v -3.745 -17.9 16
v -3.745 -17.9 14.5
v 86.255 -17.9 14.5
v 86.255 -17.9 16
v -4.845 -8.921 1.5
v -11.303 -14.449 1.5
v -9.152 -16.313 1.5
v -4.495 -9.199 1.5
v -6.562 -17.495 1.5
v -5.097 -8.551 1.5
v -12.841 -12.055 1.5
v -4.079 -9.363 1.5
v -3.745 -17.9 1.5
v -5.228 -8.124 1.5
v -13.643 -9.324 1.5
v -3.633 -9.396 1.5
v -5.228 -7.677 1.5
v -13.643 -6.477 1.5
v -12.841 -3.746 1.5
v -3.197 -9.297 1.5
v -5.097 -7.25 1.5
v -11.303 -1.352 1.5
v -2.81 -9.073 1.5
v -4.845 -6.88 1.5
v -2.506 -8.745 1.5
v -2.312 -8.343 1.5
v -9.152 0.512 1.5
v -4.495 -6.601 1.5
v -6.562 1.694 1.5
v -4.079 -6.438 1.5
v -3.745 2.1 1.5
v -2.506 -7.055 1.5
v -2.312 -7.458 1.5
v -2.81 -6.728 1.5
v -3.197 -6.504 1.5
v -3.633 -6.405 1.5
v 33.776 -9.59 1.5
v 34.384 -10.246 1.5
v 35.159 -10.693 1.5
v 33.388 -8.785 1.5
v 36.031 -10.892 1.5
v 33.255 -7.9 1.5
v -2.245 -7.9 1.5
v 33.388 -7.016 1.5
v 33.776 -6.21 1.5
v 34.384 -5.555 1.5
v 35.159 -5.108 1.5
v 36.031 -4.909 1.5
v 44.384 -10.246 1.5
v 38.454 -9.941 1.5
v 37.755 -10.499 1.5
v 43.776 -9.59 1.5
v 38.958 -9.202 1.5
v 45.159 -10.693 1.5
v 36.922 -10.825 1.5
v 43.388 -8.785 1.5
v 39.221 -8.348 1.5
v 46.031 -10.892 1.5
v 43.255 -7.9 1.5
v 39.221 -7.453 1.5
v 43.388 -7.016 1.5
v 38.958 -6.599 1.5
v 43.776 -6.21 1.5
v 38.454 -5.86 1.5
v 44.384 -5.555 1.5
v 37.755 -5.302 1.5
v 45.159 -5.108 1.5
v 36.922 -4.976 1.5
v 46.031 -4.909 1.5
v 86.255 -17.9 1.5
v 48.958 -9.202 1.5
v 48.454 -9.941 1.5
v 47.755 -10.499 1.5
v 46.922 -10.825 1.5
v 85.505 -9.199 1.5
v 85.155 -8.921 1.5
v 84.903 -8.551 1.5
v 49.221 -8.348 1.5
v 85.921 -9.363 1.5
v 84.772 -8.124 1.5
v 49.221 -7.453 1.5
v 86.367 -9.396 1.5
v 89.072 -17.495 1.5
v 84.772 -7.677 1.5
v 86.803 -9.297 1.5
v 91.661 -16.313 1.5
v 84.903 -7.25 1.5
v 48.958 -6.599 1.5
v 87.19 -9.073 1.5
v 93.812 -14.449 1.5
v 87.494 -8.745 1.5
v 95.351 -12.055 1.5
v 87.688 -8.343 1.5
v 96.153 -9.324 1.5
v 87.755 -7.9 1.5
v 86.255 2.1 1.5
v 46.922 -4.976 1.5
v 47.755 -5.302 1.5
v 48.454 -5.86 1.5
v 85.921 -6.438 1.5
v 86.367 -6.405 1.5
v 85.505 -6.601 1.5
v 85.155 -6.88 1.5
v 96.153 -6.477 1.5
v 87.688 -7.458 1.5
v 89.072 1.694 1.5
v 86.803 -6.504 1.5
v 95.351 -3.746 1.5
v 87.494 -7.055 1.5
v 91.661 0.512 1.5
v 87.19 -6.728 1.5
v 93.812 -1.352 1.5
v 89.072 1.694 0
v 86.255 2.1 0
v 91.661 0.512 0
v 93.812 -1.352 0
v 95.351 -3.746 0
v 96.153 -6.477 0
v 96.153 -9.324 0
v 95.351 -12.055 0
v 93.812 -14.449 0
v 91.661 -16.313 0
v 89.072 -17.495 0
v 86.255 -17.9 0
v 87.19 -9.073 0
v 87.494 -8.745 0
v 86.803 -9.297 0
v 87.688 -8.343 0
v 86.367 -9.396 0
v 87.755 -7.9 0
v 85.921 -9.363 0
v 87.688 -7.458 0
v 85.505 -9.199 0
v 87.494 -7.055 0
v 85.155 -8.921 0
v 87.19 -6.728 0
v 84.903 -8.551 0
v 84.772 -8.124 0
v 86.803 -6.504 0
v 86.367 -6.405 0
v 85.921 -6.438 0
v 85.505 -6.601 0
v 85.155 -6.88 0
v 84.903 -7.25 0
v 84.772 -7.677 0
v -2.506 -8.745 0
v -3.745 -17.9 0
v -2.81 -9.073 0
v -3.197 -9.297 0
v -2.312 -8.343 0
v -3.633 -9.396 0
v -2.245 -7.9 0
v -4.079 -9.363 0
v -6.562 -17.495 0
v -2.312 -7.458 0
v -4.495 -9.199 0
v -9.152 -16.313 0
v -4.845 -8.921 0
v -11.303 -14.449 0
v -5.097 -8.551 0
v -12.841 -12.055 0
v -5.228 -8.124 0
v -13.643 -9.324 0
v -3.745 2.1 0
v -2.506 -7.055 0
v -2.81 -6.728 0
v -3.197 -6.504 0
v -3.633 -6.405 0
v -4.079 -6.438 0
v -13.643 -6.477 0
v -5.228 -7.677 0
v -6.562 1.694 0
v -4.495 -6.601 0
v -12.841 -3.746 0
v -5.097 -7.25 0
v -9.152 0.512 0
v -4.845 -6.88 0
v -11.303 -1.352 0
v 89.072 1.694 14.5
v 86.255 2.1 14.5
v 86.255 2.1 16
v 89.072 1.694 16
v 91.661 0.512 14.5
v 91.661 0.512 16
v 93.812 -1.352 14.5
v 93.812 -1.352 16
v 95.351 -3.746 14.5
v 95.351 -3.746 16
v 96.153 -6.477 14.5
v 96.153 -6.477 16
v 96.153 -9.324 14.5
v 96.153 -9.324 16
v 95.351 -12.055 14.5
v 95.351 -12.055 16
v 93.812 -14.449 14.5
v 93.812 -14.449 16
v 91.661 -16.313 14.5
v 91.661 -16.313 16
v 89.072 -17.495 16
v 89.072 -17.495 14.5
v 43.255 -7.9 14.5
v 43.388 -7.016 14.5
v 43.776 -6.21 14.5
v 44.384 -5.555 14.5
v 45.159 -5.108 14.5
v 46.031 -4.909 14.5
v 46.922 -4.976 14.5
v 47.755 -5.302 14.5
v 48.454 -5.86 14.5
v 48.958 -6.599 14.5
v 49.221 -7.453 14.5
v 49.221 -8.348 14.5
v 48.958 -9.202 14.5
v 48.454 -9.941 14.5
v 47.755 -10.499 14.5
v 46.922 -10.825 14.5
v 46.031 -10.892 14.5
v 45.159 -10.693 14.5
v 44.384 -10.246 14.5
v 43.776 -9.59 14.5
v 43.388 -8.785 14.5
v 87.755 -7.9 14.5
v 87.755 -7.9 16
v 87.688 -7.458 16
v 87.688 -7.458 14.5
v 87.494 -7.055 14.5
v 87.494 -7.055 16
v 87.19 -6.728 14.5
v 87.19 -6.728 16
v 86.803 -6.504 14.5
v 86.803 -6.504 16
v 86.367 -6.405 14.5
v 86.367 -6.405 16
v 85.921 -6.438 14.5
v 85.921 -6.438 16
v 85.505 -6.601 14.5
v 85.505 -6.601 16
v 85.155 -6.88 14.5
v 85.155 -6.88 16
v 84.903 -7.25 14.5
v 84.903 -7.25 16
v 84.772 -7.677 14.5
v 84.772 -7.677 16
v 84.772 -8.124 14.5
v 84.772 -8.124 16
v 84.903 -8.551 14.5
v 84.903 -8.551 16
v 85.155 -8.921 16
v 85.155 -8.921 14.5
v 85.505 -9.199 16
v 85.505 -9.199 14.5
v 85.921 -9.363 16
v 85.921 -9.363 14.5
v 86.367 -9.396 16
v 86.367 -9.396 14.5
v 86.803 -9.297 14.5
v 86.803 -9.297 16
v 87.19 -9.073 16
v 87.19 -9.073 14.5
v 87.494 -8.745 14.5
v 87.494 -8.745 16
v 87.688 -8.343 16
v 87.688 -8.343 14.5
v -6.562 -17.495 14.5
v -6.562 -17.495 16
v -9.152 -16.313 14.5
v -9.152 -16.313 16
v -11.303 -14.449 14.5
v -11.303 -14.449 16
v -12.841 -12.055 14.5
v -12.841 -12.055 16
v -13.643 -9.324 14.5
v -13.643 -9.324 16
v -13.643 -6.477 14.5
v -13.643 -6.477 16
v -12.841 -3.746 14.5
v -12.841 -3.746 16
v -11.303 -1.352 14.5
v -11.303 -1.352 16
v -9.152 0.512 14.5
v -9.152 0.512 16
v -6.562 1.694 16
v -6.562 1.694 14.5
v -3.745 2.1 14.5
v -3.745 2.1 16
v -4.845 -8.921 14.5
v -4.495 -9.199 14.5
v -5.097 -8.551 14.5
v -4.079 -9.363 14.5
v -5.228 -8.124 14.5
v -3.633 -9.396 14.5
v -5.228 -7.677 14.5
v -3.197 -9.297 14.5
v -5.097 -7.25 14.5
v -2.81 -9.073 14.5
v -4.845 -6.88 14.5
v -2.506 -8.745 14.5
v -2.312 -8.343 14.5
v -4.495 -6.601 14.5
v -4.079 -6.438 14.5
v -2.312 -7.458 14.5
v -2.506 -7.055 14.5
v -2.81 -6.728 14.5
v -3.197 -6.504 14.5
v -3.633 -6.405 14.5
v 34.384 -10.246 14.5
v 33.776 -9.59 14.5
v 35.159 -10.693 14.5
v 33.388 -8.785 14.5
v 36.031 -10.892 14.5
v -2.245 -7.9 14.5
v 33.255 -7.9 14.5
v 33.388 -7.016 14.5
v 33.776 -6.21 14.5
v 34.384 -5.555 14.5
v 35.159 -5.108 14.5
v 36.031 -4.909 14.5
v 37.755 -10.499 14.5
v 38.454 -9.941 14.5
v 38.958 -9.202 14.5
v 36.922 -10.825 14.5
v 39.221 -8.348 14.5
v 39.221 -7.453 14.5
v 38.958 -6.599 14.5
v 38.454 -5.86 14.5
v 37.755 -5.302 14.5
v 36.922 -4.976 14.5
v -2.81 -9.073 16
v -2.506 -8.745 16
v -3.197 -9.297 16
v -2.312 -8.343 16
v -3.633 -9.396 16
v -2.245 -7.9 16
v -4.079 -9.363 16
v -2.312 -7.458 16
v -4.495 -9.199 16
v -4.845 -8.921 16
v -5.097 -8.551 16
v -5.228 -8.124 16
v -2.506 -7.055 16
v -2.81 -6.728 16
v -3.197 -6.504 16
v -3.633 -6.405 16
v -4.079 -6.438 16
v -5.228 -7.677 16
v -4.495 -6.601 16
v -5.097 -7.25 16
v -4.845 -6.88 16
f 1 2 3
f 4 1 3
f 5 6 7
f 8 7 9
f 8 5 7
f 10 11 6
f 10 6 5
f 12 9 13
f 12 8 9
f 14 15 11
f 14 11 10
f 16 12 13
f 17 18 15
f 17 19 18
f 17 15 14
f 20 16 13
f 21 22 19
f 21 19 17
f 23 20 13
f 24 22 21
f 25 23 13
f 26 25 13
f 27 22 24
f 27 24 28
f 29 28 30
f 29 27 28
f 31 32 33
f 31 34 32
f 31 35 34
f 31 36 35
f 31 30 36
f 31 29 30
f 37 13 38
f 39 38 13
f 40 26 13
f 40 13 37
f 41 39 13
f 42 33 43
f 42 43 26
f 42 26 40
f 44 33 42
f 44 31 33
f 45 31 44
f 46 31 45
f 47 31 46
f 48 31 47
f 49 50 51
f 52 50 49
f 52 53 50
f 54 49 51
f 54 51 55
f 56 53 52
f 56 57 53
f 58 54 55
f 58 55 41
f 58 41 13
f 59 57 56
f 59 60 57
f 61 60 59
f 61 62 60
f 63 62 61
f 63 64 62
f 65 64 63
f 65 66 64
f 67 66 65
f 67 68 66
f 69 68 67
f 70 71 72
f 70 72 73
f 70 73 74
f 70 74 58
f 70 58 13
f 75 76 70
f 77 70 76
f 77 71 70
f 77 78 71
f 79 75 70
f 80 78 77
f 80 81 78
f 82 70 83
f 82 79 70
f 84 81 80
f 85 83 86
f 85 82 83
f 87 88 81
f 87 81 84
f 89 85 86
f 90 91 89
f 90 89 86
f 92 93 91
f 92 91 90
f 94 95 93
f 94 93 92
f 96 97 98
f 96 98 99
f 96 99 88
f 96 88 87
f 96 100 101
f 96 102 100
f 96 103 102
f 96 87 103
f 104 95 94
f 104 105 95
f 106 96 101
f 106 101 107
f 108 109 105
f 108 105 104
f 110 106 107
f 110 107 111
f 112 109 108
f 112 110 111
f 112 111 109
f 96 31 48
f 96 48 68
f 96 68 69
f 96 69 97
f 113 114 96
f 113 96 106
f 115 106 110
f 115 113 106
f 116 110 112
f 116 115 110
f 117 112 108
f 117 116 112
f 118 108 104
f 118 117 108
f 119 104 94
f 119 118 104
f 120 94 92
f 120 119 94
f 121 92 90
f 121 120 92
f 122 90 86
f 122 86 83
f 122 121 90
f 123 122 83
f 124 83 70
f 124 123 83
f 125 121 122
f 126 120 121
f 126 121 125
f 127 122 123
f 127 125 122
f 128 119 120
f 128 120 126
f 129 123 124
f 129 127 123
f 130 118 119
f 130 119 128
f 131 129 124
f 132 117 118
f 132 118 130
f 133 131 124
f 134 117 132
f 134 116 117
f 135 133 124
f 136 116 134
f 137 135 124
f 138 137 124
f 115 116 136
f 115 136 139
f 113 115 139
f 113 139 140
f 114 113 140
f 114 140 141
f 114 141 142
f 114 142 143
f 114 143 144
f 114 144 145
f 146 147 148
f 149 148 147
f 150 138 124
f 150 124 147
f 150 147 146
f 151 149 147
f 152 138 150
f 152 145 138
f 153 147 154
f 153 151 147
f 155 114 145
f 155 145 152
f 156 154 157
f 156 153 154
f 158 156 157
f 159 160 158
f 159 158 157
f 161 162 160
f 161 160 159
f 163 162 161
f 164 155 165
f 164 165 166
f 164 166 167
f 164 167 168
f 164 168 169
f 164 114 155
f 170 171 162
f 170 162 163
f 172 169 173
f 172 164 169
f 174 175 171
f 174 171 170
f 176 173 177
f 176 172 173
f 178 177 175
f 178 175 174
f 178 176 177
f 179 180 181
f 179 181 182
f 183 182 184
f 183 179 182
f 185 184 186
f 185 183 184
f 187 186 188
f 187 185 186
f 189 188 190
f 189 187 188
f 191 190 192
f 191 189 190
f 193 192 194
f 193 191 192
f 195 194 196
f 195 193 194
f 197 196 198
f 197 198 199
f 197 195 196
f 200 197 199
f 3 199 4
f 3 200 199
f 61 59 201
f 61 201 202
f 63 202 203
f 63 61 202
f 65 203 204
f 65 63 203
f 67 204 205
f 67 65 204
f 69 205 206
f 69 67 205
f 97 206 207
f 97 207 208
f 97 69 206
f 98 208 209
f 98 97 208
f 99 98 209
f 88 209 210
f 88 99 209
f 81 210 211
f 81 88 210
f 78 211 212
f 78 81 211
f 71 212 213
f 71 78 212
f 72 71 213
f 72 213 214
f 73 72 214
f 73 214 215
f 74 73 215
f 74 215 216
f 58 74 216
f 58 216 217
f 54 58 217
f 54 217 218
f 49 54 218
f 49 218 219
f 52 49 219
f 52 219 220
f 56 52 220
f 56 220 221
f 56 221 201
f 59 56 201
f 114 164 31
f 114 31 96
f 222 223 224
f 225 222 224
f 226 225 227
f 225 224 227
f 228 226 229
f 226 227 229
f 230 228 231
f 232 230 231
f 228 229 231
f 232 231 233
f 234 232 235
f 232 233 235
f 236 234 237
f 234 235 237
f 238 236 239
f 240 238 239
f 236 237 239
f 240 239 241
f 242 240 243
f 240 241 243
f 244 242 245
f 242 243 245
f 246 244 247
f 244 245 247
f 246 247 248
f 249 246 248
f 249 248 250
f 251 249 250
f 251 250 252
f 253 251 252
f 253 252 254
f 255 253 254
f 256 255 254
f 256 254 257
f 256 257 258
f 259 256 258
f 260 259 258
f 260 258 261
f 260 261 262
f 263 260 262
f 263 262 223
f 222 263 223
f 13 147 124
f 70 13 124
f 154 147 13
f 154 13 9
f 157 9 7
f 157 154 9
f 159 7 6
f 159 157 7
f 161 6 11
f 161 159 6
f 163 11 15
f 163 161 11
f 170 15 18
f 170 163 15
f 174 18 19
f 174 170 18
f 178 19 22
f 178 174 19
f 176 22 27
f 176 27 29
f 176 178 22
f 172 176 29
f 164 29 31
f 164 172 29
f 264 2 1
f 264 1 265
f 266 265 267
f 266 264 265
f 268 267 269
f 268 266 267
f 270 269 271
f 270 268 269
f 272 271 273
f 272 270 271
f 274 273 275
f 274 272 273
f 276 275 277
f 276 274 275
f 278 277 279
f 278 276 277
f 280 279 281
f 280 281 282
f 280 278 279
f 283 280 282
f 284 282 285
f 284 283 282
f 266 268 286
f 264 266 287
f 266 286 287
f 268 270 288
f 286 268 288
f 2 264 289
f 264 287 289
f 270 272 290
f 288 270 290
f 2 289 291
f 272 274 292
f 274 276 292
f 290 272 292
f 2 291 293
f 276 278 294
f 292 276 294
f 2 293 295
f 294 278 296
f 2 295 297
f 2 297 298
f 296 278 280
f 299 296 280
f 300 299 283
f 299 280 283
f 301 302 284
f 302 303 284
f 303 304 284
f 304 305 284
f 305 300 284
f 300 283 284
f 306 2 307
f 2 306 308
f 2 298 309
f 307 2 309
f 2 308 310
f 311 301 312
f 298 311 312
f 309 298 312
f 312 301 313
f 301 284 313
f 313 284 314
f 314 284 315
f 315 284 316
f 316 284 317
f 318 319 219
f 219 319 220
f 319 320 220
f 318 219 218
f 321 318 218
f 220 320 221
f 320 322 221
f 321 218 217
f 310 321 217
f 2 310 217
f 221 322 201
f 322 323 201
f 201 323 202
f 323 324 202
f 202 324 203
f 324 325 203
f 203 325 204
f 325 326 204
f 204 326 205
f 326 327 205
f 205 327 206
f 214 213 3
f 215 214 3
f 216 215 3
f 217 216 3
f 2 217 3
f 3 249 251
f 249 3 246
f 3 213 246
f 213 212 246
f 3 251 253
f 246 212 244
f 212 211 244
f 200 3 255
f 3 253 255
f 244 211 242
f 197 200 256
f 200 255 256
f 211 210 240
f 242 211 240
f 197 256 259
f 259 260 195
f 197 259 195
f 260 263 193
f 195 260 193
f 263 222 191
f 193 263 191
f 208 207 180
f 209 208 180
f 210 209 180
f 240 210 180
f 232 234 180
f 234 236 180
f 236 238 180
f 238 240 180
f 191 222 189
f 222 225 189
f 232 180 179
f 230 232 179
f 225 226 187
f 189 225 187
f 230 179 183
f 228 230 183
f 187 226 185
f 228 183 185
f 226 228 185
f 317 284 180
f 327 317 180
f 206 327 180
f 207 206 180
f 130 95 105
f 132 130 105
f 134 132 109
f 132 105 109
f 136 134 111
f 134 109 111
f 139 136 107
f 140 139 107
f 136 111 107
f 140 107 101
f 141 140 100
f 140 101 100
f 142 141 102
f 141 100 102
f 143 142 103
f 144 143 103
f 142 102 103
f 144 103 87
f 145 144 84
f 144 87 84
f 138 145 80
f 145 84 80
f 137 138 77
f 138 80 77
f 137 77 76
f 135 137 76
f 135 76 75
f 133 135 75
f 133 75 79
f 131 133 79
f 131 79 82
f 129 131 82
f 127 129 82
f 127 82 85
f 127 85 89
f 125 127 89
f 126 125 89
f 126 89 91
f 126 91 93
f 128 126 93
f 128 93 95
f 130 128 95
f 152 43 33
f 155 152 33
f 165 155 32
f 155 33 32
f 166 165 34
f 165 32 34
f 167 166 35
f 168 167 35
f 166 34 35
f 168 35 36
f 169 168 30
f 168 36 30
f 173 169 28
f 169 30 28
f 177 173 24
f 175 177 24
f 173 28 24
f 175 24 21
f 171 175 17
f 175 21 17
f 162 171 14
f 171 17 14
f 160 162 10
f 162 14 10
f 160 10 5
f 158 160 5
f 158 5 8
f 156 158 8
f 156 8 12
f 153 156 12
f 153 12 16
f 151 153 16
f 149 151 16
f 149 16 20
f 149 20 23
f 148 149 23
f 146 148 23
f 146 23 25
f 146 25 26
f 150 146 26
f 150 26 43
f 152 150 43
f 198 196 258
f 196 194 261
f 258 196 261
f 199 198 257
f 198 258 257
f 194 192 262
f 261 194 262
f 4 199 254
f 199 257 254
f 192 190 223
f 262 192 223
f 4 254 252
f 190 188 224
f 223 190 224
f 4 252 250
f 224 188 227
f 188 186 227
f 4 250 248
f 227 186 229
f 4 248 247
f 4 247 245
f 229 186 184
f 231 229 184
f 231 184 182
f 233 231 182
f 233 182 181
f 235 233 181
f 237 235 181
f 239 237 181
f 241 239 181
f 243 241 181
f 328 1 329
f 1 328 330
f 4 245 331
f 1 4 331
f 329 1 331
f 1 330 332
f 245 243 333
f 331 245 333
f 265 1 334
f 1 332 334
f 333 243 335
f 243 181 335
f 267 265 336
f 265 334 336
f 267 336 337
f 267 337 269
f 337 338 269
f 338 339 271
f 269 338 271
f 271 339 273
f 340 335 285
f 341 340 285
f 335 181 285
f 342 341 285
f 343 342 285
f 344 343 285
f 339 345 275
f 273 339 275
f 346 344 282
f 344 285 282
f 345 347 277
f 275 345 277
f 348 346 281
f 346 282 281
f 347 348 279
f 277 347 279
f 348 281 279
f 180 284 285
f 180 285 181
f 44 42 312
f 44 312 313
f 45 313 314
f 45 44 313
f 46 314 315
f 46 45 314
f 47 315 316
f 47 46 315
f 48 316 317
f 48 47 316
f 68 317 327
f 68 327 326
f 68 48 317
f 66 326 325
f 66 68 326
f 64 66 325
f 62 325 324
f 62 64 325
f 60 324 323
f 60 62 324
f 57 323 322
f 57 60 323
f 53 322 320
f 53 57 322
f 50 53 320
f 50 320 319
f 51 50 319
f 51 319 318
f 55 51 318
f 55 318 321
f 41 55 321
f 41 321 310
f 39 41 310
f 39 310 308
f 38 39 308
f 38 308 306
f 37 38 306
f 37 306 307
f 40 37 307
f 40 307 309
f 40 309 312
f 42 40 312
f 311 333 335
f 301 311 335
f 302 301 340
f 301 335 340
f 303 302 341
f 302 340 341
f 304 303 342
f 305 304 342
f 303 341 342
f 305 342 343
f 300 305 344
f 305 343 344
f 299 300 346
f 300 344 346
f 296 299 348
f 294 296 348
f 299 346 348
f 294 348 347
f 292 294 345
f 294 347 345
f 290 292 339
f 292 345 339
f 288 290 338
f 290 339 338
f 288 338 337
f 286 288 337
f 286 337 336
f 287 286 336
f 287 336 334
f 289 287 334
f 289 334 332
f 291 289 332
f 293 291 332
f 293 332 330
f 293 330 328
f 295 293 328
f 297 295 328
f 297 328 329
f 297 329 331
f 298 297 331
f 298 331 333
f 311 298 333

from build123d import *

# Parameters (mm, degrees)
SKETCH1_W           = 90
SKETCH1_H           = 20
BOSS_EXTRUDE2_DEPTH = 16
SKETCH2_R           = 1.5
CUT_EXTRUDE1_DEPTH  = 16
SKETCH3_W           = 110.03675272
SKETCH3_H           = 13
CUT_EXTRUDE2_DEPTH  = 23
SKETCH4_R           = 3
BOSS_EXTRUDE3_DEPTH = 16


with BuildPart() as part:
    # Sketch1 → Boss-Extrude2 (new body)
    with BuildSketch(Plane.XY):
        with BuildLine():
            Line((-3.745126611, 2.099543411), (-3.745126611, -17.900456589))
            ThreePointArc((-3.745126611, -17.900456589), (-13.745126611, -7.900456589), (-3.745126611, 2.099543411))
        make_face()
        with Locations((41.254873389, -7.900456589)):
            Rectangle(SKETCH1_W, SKETCH1_H)
        with BuildLine():
            ThreePointArc((86.254873389, 2.099543411), (96.254873389, -7.900456589), (86.254873389, -17.900456589))
            Line((86.254873389, -17.900456589), (86.254873389, 2.099543411))
        make_face()
    extrude(amount=BOSS_EXTRUDE2_DEPTH)

    # Sketch2 → Cut-Extrude1 (cut)
    with BuildSketch(Plane.XY.offset(16)):
        with Locations((-3.745126611, -7.900456589)):
            Circle(SKETCH2_R)
        with Locations((86.254873389, -7.900456589)):
            Circle(SKETCH2_R)
    extrude(amount=-CUT_EXTRUDE1_DEPTH, mode=Mode.SUBTRACT)

    # Sketch3 → Cut-Extrude2 (cut)
    with BuildSketch(Plane(origin=(0, 2.099543411, 0), x_dir=(1, 0, 0), z_dir=(0, 1, 0))):
        with Locations((41.257830101, -8)):
            Rectangle(SKETCH3_W, SKETCH3_H)
    extrude(amount=-CUT_EXTRUDE2_DEPTH, mode=Mode.SUBTRACT)

    # Sketch4 → Boss-Extrude3 (add)
    with BuildSketch(Plane(origin=(0, 0, 0), x_dir=(-1, 0, 0), z_dir=(0, 0, -1))):
        with Locations((-36.254873389, -7.900456589)):
            Circle(SKETCH4_R)
        with Locations((-46.254873389, -7.900456589)):
            Circle(SKETCH4_R)
    extrude(amount=-BOSS_EXTRUDE3_DEPTH)


solid = part.part
